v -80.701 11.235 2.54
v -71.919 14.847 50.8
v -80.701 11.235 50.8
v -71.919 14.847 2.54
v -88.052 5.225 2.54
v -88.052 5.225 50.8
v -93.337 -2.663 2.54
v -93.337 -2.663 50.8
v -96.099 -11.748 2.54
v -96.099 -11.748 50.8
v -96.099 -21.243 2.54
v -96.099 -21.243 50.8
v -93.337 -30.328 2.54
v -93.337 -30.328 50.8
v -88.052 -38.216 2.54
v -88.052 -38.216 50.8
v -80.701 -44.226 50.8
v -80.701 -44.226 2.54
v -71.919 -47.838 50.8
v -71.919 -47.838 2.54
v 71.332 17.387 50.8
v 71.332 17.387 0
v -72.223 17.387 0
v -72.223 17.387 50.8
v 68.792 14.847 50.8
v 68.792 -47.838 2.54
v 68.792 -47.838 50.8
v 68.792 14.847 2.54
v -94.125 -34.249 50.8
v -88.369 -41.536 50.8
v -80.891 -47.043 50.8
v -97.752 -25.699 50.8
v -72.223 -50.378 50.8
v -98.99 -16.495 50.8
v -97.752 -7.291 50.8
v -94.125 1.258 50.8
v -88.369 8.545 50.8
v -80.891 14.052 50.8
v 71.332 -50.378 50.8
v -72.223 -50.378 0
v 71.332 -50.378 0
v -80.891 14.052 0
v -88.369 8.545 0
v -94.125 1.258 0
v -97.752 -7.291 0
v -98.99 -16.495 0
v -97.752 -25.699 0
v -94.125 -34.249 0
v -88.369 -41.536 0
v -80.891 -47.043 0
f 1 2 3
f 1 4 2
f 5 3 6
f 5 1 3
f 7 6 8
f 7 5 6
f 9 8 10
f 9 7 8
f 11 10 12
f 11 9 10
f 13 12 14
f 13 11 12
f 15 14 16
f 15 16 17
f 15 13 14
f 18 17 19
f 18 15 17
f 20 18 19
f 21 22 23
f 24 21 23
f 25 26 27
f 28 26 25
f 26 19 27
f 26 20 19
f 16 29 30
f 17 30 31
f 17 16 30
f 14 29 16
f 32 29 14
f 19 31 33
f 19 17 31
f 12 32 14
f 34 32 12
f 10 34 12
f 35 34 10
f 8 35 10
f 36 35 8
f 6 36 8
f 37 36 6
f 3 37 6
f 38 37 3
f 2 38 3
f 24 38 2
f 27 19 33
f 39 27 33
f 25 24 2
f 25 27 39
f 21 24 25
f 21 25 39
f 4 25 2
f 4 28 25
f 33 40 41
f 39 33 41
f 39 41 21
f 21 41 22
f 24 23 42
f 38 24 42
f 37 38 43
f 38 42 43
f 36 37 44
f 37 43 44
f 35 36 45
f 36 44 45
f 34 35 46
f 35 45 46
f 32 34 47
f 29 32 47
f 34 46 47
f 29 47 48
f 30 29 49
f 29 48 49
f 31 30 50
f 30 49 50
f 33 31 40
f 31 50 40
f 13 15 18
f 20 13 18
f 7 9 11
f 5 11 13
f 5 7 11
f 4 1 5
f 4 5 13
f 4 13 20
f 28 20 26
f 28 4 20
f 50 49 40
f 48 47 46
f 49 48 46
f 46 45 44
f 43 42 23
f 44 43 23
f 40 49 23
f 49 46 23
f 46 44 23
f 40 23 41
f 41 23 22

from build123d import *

# Parameters (mm, degrees)
F1_DEPTH = 50.8
F2_T     = -2.54


with BuildPart() as f1:
    # F0 (on Top) → F1 (new body)
    with BuildSketch(Plane.XY):
        with BuildLine():
            Line((71.33154, 17.38706), (-72.223172, 17.38706))
            ThreePointArc((-72.223172, 17.38706), (-98.990059, -16.495419), (-72.223172, -50.377898))
            Line((-72.223172, -50.377898), (71.33154, -50.377898))
            Line((71.33154, -50.377898), (71.33154, 17.38706))
        make_face()
    extrude(amount=F1_DEPTH)

    # F2
    f2_openings = [f1.faces().sort_by_distance(p)[0] for p in [
        (-10.546065, -16.495419, 50.8),
    ]]
    offset(amount=F2_T, openings=f2_openings)


solid = f1.part
